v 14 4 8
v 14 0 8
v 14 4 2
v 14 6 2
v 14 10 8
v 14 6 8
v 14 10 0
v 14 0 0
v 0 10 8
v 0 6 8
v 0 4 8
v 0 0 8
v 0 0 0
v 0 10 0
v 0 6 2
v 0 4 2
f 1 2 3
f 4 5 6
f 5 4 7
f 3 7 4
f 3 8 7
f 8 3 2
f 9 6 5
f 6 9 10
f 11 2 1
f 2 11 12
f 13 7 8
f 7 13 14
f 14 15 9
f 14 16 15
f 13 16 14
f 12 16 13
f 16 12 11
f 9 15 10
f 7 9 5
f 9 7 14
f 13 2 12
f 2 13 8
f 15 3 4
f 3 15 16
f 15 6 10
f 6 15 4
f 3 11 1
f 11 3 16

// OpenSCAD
$fn = 32;

// ----------------------------------------------------------------------
// Micro clip: slotted block, 5-20 mm class
// ----------------------------------------------------------------------

// --- parameters (mm) ---
block_l = 14;             // block length, X
block_w = 10;             // block width, Y
block_h = 8;              // block height, Z
slot_w = 2;               // slot width
slot_d = 6;               // slot depth from the top

difference() {
  cube([block_l, block_w, block_h]);
  translate([-1, block_w / 2 - slot_w / 2, block_h - slot_d])
    cube([block_l + 2, slot_w, slot_d + 1]);
}
